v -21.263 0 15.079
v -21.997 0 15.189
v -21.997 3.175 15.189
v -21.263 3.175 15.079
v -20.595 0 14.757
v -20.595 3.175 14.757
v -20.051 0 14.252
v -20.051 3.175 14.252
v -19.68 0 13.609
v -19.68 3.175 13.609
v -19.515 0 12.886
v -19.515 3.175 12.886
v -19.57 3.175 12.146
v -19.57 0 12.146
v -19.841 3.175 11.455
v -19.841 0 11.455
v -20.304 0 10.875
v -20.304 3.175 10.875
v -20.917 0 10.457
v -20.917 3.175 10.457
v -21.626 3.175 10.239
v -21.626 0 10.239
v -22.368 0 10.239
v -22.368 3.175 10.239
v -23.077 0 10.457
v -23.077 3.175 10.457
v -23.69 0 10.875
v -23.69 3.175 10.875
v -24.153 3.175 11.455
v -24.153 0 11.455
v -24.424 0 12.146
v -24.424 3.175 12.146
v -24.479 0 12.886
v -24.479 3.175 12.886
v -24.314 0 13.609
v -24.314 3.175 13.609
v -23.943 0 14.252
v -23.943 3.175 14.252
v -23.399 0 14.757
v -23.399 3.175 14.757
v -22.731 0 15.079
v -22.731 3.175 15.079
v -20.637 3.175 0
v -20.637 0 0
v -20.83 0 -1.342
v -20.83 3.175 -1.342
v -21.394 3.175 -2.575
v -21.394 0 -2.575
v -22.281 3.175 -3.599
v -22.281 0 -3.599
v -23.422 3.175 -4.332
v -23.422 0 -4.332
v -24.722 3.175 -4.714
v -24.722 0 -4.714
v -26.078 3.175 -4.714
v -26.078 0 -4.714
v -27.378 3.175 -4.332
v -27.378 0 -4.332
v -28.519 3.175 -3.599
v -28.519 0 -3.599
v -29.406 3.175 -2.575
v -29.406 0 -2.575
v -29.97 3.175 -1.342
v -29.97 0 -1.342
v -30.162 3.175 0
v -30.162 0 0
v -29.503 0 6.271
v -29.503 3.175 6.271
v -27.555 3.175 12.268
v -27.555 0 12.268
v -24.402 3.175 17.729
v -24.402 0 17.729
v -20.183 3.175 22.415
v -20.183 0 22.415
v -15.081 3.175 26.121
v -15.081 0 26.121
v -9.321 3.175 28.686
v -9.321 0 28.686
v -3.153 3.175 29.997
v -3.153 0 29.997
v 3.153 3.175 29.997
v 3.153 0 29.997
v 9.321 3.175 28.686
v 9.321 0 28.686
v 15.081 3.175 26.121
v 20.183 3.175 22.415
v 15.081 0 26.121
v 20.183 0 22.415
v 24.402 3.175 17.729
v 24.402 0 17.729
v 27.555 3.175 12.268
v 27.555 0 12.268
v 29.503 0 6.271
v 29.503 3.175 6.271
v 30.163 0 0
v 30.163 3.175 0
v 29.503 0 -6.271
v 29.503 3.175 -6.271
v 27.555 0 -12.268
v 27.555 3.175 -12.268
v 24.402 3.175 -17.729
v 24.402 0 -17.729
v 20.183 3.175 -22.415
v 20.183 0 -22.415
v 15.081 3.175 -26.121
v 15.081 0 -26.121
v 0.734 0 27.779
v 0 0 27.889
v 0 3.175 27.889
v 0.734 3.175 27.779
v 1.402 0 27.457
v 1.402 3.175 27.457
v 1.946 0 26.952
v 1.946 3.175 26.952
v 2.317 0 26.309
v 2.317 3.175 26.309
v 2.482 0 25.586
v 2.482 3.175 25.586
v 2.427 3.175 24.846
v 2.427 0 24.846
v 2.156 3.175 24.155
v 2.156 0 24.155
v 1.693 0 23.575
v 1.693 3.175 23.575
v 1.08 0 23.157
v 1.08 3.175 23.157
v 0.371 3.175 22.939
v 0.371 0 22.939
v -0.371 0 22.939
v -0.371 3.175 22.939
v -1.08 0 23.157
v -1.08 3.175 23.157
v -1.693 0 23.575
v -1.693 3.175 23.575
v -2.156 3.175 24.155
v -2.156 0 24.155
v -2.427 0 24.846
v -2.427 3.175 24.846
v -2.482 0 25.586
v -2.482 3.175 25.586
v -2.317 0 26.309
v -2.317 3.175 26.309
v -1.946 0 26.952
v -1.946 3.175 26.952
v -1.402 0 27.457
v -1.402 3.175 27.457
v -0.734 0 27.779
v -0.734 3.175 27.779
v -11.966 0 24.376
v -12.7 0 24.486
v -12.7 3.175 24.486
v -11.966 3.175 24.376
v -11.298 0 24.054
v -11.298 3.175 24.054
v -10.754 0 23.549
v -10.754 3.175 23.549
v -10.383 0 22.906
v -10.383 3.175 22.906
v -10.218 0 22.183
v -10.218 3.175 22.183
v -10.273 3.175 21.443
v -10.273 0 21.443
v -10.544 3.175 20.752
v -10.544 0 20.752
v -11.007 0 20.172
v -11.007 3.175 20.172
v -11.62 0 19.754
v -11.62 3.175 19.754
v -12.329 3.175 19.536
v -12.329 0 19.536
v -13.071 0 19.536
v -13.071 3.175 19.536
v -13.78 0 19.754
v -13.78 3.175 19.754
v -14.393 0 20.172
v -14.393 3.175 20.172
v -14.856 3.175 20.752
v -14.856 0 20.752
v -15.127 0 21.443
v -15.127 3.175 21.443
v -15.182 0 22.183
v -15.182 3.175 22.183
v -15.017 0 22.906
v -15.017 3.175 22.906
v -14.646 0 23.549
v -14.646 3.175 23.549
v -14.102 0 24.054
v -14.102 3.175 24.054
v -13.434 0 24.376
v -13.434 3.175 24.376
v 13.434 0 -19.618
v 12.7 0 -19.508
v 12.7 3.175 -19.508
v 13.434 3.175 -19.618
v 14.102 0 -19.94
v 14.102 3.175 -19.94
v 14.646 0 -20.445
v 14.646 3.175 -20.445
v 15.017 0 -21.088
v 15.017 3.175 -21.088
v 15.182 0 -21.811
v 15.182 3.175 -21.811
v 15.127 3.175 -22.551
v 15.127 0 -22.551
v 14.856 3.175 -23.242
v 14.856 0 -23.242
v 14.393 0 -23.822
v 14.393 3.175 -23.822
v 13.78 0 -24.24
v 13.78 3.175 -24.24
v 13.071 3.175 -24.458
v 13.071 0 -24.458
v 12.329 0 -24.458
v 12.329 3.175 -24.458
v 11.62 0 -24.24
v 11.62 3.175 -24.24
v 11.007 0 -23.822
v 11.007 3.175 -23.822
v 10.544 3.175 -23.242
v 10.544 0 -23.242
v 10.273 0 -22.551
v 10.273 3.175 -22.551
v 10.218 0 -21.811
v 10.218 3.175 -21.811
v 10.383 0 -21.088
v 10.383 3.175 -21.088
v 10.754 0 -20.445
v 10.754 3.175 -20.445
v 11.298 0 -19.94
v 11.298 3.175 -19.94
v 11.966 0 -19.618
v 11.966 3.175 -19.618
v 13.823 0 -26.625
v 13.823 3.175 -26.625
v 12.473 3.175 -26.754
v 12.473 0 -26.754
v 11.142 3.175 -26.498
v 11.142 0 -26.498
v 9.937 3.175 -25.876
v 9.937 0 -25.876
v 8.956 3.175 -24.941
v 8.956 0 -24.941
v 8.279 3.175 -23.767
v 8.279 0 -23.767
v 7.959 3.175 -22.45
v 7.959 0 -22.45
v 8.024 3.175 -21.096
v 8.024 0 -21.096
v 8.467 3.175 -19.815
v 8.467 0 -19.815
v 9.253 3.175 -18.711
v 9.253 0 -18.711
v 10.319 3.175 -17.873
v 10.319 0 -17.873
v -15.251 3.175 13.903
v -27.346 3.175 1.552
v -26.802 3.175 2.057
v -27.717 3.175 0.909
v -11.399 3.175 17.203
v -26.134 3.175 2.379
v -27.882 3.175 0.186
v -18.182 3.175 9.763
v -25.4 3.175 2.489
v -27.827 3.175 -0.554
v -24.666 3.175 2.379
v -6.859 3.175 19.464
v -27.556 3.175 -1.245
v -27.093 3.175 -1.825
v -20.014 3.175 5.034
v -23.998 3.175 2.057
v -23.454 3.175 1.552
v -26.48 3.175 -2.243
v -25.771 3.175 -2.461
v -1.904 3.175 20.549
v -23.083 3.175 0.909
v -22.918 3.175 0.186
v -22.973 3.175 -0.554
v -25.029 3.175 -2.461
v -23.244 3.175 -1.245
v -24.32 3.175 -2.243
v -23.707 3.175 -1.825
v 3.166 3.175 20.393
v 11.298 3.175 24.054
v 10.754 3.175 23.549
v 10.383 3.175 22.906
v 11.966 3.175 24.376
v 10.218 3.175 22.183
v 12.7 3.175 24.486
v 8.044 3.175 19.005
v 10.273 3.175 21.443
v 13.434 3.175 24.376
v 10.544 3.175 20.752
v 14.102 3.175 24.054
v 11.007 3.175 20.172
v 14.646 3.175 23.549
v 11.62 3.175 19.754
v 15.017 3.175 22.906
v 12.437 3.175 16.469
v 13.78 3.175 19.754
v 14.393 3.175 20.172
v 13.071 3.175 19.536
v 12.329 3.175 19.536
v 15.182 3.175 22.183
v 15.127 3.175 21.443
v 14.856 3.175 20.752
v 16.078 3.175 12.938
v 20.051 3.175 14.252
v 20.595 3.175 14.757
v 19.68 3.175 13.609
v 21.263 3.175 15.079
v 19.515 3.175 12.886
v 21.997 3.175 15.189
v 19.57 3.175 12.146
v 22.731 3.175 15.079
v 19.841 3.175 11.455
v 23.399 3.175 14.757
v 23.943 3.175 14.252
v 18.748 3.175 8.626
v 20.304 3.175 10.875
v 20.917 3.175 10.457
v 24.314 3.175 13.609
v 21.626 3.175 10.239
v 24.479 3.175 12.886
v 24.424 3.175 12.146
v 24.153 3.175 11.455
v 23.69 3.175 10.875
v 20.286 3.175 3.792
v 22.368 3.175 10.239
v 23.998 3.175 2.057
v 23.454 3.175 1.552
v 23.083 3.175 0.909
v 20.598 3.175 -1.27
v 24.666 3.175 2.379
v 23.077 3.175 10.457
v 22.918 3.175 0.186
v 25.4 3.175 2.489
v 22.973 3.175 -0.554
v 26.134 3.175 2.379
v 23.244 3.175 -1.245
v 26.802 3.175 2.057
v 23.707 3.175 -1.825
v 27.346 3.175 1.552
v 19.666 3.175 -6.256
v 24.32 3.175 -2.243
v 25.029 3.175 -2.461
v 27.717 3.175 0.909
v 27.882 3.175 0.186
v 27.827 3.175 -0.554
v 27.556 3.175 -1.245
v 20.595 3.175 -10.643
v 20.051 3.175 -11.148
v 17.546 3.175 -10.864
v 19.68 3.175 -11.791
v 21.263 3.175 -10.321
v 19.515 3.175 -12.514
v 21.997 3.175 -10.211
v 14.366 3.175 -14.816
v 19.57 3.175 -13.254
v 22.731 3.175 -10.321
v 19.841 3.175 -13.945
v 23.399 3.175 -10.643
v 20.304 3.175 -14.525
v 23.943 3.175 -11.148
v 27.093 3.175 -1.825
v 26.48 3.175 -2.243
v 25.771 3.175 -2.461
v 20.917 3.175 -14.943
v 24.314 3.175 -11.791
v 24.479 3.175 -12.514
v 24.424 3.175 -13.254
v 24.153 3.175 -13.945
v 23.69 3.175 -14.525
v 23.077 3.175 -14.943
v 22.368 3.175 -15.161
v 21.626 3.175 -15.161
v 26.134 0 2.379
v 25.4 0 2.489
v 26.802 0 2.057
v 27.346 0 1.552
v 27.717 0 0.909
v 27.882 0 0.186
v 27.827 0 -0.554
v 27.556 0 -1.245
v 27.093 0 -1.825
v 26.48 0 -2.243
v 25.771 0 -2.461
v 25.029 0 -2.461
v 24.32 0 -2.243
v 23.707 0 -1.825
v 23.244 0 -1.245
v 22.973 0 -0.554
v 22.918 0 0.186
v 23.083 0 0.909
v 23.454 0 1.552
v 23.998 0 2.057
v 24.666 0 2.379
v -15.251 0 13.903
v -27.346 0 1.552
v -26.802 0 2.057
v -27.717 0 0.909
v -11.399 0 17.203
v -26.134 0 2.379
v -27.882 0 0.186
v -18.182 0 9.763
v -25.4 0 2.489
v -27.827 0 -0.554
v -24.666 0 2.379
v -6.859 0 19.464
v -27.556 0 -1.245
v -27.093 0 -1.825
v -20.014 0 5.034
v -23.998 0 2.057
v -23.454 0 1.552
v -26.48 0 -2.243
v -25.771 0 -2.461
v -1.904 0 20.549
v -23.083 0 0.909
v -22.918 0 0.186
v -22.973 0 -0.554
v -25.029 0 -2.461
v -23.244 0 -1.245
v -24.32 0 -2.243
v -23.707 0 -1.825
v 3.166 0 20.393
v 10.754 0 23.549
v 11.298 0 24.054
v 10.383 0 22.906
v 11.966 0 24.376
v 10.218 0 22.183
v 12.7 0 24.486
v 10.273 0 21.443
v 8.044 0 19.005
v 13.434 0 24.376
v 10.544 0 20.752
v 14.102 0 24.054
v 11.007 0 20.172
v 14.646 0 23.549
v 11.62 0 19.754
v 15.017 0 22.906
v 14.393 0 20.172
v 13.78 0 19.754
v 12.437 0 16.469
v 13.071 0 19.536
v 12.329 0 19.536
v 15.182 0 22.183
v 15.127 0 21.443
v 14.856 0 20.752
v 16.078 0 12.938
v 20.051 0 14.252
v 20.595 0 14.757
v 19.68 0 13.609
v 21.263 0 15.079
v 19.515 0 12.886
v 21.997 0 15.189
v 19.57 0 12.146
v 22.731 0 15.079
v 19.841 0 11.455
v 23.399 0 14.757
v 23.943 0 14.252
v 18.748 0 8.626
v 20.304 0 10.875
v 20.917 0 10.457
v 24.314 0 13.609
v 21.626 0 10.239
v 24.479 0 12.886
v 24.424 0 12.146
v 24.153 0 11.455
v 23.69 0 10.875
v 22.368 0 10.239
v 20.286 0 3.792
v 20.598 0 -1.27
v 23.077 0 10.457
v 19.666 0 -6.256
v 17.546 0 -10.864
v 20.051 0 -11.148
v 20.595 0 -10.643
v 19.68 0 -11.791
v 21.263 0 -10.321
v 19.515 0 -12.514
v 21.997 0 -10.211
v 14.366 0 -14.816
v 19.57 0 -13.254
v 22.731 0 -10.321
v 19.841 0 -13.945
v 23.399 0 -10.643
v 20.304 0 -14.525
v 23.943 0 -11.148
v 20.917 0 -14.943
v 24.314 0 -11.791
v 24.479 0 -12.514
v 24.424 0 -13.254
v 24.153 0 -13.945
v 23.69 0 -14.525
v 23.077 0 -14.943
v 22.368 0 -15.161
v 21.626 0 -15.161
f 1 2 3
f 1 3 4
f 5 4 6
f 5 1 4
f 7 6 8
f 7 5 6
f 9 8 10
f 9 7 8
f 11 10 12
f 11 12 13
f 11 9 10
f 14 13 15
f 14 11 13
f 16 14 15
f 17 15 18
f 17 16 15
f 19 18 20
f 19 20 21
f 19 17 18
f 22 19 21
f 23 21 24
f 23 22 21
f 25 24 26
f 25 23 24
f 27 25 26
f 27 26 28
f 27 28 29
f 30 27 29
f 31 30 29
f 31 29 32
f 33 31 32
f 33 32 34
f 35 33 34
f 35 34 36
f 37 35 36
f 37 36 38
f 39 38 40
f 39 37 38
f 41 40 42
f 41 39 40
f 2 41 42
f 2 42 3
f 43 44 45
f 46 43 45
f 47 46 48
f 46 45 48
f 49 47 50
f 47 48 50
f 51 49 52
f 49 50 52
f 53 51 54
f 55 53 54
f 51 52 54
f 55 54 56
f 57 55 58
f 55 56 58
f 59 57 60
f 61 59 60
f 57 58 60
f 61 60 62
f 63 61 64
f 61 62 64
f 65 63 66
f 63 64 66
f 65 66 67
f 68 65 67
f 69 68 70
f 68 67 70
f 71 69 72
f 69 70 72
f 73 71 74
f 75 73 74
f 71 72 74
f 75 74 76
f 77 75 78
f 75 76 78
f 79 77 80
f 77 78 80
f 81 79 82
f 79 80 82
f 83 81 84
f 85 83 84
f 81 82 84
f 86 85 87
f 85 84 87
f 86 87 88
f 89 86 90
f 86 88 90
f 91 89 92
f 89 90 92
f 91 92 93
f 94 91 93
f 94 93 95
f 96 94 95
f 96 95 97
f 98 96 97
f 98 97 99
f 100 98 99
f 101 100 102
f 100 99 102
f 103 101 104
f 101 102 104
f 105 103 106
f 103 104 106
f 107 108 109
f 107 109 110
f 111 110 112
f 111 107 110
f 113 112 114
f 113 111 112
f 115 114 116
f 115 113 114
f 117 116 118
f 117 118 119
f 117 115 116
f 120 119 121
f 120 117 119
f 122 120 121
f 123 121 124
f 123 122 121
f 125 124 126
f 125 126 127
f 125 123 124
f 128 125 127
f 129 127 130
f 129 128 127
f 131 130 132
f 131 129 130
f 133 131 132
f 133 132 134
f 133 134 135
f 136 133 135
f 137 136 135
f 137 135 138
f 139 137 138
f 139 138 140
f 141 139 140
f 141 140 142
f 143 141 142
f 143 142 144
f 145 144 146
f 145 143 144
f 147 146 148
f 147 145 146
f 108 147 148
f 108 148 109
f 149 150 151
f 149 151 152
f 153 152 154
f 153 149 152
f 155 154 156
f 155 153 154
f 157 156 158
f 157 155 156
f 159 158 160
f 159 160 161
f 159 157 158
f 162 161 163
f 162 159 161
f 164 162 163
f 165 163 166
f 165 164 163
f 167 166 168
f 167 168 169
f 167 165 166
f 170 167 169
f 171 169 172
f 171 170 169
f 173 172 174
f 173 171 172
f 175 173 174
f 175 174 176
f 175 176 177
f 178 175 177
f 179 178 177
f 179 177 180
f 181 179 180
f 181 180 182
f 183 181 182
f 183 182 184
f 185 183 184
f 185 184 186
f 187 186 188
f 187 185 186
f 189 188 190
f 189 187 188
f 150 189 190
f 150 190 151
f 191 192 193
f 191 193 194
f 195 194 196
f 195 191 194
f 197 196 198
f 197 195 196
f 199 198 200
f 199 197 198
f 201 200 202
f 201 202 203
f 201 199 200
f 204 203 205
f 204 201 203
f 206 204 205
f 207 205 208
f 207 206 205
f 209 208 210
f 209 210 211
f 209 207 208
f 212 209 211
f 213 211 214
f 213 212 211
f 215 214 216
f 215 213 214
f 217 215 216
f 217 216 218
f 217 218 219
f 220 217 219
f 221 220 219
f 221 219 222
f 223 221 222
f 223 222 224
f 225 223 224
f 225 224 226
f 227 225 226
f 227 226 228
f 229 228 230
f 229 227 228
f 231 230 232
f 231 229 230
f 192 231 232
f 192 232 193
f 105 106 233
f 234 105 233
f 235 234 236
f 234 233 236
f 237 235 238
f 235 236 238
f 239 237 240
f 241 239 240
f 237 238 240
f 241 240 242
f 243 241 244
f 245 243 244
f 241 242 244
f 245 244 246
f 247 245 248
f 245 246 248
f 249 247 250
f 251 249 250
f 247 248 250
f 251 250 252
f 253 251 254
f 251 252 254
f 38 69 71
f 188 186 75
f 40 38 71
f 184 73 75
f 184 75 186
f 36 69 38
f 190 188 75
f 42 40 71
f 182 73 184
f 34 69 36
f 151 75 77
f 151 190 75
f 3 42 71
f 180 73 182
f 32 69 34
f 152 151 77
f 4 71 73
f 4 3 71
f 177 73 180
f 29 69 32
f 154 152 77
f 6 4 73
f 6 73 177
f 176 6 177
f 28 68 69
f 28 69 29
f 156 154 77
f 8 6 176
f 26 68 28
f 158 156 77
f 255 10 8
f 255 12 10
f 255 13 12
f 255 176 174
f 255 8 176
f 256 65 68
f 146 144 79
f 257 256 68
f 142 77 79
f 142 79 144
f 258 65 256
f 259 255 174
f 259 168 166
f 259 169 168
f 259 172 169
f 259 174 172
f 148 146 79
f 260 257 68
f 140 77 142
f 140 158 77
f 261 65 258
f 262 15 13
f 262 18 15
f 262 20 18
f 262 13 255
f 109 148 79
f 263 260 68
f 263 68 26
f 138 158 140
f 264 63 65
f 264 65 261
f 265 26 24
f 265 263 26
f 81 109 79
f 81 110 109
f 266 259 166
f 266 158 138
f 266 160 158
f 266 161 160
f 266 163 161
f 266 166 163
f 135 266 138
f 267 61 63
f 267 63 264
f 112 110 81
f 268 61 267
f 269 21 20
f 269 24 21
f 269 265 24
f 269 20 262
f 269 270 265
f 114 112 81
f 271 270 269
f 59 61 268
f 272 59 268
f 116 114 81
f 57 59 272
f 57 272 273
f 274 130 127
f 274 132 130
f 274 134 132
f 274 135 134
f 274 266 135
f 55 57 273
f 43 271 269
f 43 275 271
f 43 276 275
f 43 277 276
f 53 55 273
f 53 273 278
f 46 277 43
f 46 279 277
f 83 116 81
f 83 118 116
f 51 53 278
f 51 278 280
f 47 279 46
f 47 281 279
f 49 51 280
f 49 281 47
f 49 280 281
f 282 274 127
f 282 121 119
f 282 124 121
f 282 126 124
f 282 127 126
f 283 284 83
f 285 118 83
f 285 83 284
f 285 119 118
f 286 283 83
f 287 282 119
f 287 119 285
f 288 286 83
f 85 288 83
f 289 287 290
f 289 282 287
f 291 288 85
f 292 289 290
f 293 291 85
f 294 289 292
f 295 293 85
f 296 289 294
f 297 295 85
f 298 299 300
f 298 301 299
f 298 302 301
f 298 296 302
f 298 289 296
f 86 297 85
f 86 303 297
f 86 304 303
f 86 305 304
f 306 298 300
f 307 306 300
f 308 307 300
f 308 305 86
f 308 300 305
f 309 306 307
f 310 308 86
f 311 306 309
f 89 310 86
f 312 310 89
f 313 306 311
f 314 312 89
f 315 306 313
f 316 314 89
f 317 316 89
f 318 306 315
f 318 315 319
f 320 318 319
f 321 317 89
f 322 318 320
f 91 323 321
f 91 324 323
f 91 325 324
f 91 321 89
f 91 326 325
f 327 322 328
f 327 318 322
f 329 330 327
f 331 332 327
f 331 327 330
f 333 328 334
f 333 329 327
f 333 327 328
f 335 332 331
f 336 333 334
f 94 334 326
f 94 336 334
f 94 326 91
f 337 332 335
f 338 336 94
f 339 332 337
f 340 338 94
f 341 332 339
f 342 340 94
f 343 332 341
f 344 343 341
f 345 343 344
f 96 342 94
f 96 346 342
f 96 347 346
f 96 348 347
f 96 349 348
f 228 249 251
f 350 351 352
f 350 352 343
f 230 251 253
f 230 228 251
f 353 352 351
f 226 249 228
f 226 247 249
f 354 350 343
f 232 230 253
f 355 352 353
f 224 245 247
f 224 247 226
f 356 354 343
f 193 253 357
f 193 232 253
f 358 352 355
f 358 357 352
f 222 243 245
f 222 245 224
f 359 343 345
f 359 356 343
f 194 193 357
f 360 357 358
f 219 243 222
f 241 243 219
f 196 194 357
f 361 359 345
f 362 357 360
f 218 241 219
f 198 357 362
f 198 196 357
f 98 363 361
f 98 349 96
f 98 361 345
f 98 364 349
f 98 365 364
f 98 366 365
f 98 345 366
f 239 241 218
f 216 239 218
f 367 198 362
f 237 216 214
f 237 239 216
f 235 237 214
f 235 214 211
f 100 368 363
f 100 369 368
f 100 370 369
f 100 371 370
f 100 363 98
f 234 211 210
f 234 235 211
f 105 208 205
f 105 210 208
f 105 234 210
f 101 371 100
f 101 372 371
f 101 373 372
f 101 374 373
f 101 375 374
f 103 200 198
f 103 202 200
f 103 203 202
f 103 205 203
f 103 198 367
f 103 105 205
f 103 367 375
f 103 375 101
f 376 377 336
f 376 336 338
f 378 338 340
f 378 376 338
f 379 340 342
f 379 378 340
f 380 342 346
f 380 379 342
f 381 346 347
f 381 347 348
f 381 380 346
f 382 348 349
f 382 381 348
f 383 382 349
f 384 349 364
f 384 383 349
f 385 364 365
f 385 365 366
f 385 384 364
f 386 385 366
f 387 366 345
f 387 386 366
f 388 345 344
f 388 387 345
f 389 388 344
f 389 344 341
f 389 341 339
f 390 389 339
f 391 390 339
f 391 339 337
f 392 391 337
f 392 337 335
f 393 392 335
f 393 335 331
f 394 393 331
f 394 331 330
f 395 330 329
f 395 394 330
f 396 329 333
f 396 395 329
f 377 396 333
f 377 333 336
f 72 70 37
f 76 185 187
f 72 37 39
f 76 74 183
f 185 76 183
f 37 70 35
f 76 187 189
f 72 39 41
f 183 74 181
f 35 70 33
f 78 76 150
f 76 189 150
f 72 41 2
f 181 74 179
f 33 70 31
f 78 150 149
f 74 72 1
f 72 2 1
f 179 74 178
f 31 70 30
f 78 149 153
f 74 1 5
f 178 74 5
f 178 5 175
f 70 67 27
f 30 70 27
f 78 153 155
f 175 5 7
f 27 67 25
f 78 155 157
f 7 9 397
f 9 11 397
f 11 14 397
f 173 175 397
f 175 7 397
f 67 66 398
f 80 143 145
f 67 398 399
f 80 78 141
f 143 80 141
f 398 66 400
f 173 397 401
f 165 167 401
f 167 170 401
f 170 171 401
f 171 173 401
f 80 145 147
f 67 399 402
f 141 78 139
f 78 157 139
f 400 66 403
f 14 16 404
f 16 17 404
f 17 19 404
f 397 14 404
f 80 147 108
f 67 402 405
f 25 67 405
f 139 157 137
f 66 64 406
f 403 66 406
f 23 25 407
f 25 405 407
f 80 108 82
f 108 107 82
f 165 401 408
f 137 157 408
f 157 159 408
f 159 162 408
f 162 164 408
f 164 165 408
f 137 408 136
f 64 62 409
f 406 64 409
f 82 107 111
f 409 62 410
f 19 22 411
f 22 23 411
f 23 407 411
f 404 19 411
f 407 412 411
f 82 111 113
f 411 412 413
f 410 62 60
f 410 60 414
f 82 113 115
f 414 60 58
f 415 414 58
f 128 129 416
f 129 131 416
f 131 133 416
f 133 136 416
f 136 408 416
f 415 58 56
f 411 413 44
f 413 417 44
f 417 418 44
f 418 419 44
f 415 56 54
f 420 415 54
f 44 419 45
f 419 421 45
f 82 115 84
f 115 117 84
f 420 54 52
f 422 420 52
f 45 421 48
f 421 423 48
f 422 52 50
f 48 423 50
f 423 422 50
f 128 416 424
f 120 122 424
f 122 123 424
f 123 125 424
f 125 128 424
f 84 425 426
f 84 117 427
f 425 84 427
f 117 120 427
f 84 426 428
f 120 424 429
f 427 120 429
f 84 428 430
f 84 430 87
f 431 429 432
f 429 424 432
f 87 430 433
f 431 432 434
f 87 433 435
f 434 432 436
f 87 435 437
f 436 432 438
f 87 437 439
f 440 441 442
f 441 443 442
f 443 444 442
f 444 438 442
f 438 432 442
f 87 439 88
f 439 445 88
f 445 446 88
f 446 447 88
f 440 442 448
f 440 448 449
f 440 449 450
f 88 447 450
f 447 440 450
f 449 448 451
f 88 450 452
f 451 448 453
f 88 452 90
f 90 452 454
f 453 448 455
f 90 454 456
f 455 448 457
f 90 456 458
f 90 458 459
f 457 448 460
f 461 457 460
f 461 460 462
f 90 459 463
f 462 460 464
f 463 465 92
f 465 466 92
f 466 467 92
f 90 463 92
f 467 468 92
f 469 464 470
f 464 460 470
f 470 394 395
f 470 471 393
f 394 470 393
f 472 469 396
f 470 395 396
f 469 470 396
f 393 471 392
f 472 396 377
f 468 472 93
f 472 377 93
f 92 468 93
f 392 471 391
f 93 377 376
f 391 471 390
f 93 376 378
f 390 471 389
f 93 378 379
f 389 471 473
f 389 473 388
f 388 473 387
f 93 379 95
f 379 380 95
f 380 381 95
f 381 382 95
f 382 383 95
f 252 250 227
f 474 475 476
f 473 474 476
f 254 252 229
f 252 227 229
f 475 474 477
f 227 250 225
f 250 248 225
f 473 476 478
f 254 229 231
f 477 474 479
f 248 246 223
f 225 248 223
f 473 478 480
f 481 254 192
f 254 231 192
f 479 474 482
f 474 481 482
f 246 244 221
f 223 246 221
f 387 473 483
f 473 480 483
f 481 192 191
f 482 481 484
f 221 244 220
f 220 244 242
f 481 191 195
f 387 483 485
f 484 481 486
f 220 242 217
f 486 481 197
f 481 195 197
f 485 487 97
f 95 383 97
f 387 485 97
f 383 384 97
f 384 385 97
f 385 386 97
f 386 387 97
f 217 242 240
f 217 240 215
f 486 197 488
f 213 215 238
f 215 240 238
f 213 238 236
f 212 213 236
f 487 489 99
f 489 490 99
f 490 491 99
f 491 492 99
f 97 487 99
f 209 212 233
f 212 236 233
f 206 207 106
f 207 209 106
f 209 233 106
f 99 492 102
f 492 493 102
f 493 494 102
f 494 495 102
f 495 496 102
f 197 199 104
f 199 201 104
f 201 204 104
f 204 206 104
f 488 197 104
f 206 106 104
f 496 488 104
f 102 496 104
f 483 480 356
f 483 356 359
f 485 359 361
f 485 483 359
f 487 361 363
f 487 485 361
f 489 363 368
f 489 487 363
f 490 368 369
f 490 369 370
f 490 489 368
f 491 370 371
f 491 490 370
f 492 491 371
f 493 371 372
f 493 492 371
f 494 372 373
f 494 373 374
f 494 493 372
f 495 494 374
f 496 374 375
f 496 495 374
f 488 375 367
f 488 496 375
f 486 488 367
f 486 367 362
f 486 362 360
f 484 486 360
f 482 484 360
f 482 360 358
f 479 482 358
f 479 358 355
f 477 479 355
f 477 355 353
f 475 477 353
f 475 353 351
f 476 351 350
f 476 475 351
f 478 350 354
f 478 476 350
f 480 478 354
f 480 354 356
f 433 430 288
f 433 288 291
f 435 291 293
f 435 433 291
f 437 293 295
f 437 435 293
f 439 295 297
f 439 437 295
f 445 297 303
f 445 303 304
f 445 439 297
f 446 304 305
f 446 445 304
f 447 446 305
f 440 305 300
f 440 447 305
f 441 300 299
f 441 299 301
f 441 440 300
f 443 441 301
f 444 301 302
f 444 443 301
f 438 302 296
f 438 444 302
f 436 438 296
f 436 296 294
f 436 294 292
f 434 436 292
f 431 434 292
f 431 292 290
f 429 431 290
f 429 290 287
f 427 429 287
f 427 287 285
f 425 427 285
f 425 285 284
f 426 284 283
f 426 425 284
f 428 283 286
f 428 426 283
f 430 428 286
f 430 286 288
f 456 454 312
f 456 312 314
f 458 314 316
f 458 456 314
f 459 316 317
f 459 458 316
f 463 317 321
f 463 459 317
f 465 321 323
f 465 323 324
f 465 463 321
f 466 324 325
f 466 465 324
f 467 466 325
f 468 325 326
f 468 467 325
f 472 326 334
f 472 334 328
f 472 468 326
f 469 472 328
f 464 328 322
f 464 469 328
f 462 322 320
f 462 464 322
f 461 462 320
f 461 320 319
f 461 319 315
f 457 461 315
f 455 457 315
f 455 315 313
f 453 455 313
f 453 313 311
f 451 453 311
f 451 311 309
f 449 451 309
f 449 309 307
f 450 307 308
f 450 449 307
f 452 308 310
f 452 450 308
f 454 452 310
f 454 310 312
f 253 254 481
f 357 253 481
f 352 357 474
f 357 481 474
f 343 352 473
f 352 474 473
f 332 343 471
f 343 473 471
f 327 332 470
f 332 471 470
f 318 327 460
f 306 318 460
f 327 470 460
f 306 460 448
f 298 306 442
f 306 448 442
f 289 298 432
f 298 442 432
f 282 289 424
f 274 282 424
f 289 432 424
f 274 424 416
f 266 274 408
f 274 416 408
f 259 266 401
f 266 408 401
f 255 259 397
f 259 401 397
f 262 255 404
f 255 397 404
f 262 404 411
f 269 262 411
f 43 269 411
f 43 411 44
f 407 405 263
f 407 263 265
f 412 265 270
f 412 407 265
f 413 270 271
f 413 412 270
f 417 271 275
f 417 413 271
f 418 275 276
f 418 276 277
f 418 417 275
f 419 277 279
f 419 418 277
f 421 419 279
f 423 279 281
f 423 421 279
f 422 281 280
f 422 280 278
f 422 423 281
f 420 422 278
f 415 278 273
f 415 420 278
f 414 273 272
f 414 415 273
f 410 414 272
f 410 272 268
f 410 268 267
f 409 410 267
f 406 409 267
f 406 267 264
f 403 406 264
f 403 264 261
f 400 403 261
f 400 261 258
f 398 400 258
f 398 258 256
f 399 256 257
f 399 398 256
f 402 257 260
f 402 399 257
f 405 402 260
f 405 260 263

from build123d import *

# Parameters (mm, degrees)
SKETCH1_R           = 2.4892
BOSS_EXTRUDE1_DEPTH = 3.175


with BuildPart() as part:
    # Sketch1 → Boss-Extrude1 (new body)
    with BuildSketch(Plane(origin=(0, 0, 0), x_dir=(1, 0, 0), z_dir=(0, 1, 0))):
        with BuildLine():
            ThreePointArc((-30.1625, 0), (15.08125, -26.121491242), (15.08125, 26.121491242))
            ThreePointArc((15.08125, 26.121491242), (8.575554014, 24.378295256), (10.31875, 17.872599271))
            ThreePointArc((10.31875, 17.872599271), (10.31875, -17.872599271), (-20.6375, 0))
            ThreePointArc((-20.6375, 0), (-25.4, 4.7625), (-30.1625, 0))
        make_face()
        with Locations(Location((25.4, 0, 0), (0, 0, 270))):
            Circle(SKETCH1_R, mode=Mode.SUBTRACT)
        with Locations(Location((21.997045256, -12.7, 0), (0, 0, 270))):
            Circle(SKETCH1_R, mode=Mode.SUBTRACT)
        with Locations(Location((12.7, -21.997045256, 0), (0, 0, 270))):
            Circle(SKETCH1_R, mode=Mode.SUBTRACT)
        with Locations(Location((0, -25.4, 0), (0, 0, 270))):
            Circle(SKETCH1_R, mode=Mode.SUBTRACT)
        with Locations(Location((-12.7, -21.997045256, 0), (0, 0, 270))):
            Circle(SKETCH1_R, mode=Mode.SUBTRACT)
        with Locations(Location((-21.997045256, -12.7, 0), (0, 0, 270))):
            Circle(SKETCH1_R, mode=Mode.SUBTRACT)
        with Locations(Location((-25.4, 0, 0), (0, 0, 270))):
            Circle(SKETCH1_R, mode=Mode.SUBTRACT)
        with Locations(Location((12.7, 21.997045256, 0), (0, 0, 270))):
            Circle(SKETCH1_R, mode=Mode.SUBTRACT)
        with Locations(Location((21.997045256, 12.7, 0), (0, 0, 270))):
            Circle(SKETCH1_R, mode=Mode.SUBTRACT)
    extrude(amount=BOSS_EXTRUDE1_DEPTH)


solid = part.part
